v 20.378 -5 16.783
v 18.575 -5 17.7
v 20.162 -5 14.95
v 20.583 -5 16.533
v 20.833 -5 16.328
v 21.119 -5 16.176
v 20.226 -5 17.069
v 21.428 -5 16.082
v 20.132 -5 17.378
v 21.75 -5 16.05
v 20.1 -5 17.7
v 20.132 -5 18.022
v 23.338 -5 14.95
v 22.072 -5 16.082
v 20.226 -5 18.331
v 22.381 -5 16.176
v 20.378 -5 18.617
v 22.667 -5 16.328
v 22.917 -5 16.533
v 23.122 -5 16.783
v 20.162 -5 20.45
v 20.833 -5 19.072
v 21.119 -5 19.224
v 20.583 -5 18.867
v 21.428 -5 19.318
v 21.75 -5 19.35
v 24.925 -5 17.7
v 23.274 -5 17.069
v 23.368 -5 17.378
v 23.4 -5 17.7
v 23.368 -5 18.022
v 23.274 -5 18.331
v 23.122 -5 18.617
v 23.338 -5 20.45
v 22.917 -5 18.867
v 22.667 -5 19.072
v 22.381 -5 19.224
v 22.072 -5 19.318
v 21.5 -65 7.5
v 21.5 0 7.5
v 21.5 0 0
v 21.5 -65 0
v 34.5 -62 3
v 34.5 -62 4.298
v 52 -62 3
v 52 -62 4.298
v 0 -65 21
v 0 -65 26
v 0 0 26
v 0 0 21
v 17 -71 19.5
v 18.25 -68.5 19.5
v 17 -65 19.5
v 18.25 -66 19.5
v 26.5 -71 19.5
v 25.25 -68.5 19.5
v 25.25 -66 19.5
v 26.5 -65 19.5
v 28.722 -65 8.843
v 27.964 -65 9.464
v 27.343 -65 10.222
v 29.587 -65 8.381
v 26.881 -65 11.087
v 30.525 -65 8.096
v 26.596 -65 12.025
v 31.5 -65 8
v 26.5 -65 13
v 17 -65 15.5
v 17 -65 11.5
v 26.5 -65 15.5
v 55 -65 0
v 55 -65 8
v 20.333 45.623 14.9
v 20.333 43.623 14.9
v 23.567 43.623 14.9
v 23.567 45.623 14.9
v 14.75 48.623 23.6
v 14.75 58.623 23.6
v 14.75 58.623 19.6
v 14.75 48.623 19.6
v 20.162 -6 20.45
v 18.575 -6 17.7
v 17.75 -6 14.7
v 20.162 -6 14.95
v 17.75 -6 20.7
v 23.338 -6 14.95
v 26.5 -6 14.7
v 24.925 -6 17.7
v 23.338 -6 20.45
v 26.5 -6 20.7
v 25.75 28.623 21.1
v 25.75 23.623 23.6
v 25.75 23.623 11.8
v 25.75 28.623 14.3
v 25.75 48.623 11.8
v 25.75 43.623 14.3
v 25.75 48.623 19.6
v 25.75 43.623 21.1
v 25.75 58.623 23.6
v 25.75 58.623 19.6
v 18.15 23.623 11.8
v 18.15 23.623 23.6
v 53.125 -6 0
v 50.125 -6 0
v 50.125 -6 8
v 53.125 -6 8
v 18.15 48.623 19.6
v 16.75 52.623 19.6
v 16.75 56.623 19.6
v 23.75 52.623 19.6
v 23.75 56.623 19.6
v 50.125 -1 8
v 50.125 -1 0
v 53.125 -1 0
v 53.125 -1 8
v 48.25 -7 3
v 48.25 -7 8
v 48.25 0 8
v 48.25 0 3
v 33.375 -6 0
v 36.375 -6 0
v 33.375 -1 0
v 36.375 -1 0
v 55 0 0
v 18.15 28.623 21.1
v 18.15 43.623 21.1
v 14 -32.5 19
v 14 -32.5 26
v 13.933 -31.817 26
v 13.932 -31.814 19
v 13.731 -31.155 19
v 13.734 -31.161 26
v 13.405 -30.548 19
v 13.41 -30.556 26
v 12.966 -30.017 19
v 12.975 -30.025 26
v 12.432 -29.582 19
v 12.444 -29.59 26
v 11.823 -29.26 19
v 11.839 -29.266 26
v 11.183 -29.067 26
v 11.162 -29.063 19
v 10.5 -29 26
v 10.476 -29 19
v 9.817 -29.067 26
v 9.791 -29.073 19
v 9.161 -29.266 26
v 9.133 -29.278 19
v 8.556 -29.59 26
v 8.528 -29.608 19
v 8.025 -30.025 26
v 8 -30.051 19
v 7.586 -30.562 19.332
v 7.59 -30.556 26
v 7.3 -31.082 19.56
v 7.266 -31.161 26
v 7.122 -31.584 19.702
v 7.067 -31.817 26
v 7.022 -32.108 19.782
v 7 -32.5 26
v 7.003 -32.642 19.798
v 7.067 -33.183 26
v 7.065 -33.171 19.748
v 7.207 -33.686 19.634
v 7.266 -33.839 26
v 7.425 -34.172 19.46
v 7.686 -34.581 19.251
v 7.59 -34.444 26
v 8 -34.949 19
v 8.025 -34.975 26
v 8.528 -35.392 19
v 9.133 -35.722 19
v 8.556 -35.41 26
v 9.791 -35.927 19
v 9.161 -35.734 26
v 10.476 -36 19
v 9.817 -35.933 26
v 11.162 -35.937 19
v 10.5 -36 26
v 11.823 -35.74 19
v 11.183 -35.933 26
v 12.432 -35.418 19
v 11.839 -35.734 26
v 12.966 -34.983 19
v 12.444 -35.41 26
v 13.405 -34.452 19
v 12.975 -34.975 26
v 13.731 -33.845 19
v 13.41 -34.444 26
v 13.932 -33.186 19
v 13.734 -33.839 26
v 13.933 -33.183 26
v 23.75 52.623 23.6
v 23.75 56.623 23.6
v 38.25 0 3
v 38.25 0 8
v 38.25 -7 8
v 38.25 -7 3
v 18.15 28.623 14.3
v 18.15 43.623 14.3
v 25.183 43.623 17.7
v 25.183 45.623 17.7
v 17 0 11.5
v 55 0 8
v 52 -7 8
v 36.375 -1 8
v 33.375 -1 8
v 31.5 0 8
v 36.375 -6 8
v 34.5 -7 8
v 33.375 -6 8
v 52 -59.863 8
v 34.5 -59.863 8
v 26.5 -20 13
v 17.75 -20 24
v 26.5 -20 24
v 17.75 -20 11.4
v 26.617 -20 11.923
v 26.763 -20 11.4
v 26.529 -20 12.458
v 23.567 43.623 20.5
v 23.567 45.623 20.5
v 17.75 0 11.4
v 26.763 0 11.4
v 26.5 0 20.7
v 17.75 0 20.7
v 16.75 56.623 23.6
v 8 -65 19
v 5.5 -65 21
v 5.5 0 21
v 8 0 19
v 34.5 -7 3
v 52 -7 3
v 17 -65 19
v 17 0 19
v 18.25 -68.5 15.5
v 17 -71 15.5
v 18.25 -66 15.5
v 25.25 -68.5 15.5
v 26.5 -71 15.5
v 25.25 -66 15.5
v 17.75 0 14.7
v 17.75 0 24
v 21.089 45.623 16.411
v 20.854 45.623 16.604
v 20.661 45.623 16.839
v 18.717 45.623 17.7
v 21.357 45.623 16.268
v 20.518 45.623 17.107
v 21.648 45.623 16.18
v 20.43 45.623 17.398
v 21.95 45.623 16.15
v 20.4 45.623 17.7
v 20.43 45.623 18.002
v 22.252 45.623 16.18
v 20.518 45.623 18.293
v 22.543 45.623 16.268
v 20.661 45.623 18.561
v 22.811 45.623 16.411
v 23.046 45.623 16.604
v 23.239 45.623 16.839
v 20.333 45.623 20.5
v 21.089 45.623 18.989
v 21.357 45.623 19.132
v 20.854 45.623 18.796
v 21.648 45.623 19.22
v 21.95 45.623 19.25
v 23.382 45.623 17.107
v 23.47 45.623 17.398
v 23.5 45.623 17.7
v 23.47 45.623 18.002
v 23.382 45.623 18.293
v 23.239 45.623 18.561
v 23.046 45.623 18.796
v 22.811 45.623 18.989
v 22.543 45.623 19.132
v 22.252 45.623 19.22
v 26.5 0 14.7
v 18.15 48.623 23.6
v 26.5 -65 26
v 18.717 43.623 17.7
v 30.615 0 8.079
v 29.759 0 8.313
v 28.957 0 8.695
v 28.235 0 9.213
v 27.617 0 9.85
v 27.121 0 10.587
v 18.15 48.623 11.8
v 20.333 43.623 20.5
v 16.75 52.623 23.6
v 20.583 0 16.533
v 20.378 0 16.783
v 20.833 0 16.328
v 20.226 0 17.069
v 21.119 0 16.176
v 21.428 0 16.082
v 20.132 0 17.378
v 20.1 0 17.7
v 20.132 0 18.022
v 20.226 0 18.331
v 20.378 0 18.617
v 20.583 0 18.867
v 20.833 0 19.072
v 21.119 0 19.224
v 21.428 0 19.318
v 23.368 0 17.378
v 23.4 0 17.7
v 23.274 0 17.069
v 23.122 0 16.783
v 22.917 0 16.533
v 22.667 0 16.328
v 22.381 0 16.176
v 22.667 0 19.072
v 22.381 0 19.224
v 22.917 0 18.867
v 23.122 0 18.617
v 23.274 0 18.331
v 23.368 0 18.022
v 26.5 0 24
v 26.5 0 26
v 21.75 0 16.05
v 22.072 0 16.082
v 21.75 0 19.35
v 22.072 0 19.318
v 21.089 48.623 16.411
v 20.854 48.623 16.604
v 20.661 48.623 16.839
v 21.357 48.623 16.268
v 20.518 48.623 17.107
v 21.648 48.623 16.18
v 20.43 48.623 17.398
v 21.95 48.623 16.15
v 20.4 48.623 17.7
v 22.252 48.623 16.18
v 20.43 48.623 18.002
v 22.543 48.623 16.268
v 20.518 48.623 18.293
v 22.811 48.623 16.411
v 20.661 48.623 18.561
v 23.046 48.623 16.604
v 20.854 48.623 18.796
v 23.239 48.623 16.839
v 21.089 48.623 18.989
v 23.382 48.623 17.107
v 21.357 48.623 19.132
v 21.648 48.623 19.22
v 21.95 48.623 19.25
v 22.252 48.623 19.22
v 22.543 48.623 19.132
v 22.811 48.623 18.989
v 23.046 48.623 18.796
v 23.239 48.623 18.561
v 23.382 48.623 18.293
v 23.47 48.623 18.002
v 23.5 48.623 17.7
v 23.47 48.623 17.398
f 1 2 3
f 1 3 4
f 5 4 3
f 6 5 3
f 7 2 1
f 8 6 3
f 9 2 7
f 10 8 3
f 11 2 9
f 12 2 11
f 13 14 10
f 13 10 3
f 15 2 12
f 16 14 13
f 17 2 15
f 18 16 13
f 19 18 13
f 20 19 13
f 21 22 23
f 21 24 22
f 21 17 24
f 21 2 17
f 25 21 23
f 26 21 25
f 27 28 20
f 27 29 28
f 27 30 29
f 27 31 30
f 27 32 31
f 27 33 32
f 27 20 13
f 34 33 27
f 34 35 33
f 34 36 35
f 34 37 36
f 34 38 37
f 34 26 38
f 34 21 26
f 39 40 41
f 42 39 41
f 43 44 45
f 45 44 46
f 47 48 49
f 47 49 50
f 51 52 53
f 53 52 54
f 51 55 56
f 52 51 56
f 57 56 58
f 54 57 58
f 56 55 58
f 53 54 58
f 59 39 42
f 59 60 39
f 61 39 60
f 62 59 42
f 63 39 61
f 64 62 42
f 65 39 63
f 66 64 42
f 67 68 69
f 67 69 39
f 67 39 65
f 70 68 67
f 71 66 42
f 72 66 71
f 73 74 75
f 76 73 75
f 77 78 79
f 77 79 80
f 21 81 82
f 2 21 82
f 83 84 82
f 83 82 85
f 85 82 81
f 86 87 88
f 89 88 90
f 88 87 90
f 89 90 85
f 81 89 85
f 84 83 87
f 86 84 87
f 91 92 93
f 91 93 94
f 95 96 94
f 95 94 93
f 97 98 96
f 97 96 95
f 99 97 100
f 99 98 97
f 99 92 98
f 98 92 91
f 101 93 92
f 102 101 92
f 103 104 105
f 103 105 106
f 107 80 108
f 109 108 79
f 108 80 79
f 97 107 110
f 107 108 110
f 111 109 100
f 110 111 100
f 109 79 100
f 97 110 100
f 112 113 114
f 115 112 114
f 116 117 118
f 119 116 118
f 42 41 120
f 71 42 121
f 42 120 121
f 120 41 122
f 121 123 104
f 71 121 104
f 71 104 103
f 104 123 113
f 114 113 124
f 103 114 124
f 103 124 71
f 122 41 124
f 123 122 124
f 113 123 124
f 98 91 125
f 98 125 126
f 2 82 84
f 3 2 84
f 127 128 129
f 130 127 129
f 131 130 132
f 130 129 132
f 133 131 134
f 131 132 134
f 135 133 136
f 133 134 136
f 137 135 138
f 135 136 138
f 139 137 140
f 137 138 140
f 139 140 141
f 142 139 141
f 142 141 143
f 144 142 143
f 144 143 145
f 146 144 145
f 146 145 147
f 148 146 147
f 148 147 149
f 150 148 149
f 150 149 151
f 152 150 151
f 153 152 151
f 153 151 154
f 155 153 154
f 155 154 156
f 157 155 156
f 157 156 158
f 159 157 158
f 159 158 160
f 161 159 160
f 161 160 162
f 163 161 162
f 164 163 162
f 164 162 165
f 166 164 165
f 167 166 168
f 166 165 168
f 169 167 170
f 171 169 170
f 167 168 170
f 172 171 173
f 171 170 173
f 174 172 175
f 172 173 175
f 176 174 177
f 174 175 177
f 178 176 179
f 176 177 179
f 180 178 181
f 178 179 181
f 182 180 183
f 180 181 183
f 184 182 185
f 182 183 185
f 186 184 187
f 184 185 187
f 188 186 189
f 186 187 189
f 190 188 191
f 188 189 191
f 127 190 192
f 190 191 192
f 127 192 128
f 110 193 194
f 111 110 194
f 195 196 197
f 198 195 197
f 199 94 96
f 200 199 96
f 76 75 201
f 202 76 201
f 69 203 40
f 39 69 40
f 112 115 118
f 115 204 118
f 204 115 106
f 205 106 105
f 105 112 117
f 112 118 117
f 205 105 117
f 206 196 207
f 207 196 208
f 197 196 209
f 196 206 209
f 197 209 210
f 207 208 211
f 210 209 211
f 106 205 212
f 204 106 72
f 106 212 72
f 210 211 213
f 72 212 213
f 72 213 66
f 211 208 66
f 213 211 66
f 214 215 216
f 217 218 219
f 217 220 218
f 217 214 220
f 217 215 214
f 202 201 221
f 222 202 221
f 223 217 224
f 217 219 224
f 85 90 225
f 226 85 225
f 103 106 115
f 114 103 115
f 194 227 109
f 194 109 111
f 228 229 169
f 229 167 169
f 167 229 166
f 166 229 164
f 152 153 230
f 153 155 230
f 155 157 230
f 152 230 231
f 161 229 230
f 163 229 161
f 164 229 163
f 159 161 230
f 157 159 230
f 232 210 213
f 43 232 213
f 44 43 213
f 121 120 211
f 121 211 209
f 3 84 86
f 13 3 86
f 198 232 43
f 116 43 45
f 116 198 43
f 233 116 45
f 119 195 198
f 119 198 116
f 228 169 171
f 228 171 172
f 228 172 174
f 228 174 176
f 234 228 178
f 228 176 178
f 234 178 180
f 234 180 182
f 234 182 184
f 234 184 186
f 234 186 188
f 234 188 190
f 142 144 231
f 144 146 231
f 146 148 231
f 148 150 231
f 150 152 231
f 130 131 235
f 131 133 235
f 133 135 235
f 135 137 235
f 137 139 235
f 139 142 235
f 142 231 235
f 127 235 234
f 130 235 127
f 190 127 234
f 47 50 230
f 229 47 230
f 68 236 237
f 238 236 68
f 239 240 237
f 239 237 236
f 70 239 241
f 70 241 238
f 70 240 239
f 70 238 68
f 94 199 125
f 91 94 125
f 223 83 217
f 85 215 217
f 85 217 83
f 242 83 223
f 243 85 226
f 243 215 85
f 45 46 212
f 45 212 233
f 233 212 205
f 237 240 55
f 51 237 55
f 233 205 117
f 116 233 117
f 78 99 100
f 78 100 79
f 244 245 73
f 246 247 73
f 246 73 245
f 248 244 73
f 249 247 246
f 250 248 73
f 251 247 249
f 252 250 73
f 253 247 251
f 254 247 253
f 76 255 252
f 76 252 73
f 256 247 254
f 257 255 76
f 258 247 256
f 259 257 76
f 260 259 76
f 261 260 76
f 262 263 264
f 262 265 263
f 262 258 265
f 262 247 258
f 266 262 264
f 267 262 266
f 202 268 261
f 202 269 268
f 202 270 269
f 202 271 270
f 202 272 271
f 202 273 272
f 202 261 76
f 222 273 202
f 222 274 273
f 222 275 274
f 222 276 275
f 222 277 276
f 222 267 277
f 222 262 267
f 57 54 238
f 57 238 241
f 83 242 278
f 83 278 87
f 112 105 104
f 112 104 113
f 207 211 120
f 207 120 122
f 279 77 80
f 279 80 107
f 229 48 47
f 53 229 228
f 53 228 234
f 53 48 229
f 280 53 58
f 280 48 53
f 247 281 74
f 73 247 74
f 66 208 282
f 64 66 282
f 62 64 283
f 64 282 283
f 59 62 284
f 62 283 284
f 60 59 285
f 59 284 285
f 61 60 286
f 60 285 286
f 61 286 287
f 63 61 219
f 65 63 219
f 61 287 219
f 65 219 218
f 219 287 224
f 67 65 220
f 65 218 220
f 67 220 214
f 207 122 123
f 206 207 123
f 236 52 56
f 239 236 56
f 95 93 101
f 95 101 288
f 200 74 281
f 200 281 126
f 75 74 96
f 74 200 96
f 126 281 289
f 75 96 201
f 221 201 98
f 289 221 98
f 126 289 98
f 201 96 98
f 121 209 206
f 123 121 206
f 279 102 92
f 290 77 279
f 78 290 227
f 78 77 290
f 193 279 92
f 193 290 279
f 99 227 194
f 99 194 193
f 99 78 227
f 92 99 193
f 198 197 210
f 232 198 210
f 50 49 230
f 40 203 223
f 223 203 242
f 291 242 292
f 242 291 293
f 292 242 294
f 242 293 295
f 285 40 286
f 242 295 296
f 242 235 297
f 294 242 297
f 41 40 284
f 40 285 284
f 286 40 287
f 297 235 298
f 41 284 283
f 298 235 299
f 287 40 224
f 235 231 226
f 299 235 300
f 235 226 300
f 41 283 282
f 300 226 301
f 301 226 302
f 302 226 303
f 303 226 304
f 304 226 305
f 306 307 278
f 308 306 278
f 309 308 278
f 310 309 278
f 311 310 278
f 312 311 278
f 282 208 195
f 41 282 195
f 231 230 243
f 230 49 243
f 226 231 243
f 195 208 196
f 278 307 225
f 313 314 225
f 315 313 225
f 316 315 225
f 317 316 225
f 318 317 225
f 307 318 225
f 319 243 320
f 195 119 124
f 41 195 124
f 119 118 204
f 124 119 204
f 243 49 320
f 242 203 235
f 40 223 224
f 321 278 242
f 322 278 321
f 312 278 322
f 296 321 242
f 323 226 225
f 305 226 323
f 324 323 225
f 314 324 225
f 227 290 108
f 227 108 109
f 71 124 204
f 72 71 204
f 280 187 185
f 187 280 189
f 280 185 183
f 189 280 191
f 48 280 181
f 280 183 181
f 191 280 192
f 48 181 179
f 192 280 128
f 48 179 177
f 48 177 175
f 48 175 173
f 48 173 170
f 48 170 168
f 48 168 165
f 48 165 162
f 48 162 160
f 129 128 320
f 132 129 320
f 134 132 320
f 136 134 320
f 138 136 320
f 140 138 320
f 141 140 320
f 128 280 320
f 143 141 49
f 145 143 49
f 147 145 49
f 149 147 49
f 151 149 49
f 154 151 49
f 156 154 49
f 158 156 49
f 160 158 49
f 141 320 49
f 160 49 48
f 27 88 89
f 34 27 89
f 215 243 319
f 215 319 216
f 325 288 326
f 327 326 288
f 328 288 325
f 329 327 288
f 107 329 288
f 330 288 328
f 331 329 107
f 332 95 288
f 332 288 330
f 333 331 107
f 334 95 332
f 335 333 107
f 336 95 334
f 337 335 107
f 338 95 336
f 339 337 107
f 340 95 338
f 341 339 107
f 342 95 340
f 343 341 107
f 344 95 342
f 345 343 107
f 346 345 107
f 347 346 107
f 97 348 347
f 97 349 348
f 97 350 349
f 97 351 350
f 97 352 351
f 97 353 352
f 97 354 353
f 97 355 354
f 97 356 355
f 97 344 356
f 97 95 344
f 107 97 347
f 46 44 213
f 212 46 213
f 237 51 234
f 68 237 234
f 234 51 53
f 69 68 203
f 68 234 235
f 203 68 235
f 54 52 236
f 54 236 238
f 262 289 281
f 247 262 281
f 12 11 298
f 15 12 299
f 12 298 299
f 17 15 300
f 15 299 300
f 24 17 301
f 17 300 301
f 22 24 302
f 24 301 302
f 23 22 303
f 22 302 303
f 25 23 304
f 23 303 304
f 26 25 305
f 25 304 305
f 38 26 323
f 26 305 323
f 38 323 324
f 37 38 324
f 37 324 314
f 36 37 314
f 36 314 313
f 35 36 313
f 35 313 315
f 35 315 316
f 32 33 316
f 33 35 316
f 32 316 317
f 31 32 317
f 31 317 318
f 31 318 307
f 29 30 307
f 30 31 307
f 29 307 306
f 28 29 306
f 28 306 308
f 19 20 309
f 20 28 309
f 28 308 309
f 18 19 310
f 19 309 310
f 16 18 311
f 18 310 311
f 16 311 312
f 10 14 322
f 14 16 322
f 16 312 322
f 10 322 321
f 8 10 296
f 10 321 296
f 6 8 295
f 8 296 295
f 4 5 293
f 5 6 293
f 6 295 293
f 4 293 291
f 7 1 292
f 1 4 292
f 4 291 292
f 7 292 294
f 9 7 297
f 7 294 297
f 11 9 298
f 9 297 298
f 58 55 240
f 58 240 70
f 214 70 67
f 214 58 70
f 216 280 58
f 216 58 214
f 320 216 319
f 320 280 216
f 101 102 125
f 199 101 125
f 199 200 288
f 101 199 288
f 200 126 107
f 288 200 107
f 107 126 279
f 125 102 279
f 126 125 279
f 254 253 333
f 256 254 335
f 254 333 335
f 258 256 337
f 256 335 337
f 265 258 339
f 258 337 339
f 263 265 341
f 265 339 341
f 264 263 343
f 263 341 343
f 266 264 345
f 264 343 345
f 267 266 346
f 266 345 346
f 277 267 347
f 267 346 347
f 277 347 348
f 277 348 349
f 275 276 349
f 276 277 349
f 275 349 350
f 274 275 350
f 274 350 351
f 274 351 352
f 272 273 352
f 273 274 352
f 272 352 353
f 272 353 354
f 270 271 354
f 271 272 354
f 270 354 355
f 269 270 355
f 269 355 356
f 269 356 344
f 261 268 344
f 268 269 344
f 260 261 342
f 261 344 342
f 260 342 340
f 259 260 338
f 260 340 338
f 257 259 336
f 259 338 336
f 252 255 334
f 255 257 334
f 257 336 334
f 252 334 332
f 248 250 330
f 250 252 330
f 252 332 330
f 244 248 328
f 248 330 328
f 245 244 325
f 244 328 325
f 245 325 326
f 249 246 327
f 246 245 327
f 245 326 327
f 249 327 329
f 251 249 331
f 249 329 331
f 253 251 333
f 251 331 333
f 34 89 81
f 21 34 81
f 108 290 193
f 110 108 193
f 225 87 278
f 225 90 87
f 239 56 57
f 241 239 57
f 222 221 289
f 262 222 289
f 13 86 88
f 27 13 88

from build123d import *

# Parameters (mm, degrees)
F1_DEPTH  = 65
F2_R      = 3.5
F3_DEPTH  = 7
F5_DEPTH  = 5
F7_DEPTH  = 17.5
F9_W      = 6
F9_H      = 4
F10_DEPTH = 9.5
F11_W     = 7
F11_H     = 2.5
F12_DEPTH = 4
F15_DEPTH = 8
F16_R     = 1.65
F17_DEPTH = 6
F18_R     = 1.65
F19_DEPTH = 1
F20_DEPTH = 8
F21_DEPTH = 1.0139122871
F22_W     = 3
F22_H     = 5
F23_DEPTH = 8
F24_W     = 25
F24_H     = 11.8
F24_W_2   = 15
F24_H_2   = 6.8
F25_DEPTH = 7.6
F26_R     = 1.55
F27_DEPTH = 5
F28_R     = 1.55
F29_DEPTH = 2
F30_W     = 7
F30_H     = 4
F31_DEPTH = 4


# Not quite as in the source:
# - a feature names something its author has since deleted; it is built from what else it names


with BuildPart() as f1:
    # F0 (on Front) → F1 (new body)
    with BuildSketch(Plane.XZ):
        with BuildLine():
            Line((0, 26), (0, 21))
            Line((0, 21), (5.5, 21))
            Line((5.5, 21), (8, 19))
            Line((8, 19), (17, 19))
            Line((17, 19), (17, 11.5))
            Line((17, 11.5), (21.5, 7.5))
            Line((21.5, 7.5), (21.5, 0))
            Line((21.5, 0), (55, 0))
            Line((55, 0), (55, 8))
            Line((55, 8), (31.5, 8))
            ThreePointArc((31.5, 8), (27.9644660941, 9.4644660941), (26.5, 13))
            Line((26.5, 13), (26.5, 26))
            Line((26.5, 26), (0, 26))
        make_face()
    extrude(amount=F1_DEPTH)

    # F2 (on face) → F3 (cut, through all)
    with BuildSketch(Plane.XY.offset(26)):
        with Locations((10.5, -32.5)):
            Circle(F2_R)
    extrude(amount=-F3_DEPTH, mode=Mode.SUBTRACT)

    # F4 (on face) → F5 (cut)
    with BuildSketch(Plane.XY.offset(8)):
        Polygon((34.5, -62), (52, -62), (52, -7), (48.25, -7), (48.25, 0), (38.25, 0), (38.25, -7), (34.5, -7), align=None)
    extrude(amount=-F5_DEPTH, mode=Mode.SUBTRACT)

    # F6 (on face) → F7 (join, through all)
    with BuildSketch(Plane.YZ.offset(34.5)):
        Polygon((-62, 8), (-62, 4.2981612496), (-59.862742401, 8), align=None)
    extrude(amount=F7_DEPTH)

    # F9 (on offset) → F10 (join, through all)
    with BuildSketch(Plane.YZ.offset(26.5)):
        with Locations((-68, 17.5)):
            Rectangle(F9_W, F9_H)
    extrude(amount=-F10_DEPTH)

    # F11 (on face) → F12 (cut, through all)
    with BuildSketch(Plane.XY.offset(19.5)):
        with Locations((21.75, -67.25)):
            Rectangle(F11_W, F11_H)
    extrude(amount=-F12_DEPTH, mode=Mode.SUBTRACT)

    # F14 (on offset) → F15 (cut)
    with BuildSketch(Plane.YZ.offset(25.75)):
        Polygon((-20, 11.4), (0, 11.4), (0, 14.7), (-6, 14.7), (-6, 20.7), (0, 20.7), (0, 24), (-20, 24), align=None)
    extrude(amount=-F15_DEPTH, mode=Mode.SUBTRACT)

    # F16 (on face) → F17 (cut, through all)
    with BuildSketch(Plane(origin=(0, 0, 0), x_dir=(-1, 0, 0), z_dir=(0, 1, 0))):
        with Locations((-21.75, 17.7)):
            Circle(F16_R)
    extrude(amount=-F17_DEPTH, mode=Mode.SUBTRACT)

    # F18 (on face) → F19 (cut)
    with BuildSketch(Plane.XZ.offset(6)):
        Polygon((23.3377132403, 14.95), (24.9254264805, 17.7), (23.3377132403, 20.45), (20.1622867597, 20.45), (18.5745735195, 17.7), (20.1622867597, 14.95), align=None)
        with Locations((21.75, 17.7)):
            Circle(F18_R, mode=Mode.SUBTRACT)
    extrude(amount=-F19_DEPTH, mode=Mode.SUBTRACT)

    # F14 (on offset) → F20 (cut, through all)
    with BuildSketch(Plane.YZ.offset(25.75)):
        Polygon((-20, 11.4), (0, 11.4), (0, 14.7), (-6, 14.7), (-6, 20.7), (0, 20.7), (0, 24), (-20, 24), align=None)
    extrude(amount=-F20_DEPTH, mode=Mode.SUBTRACT)

    # F14 (on offset) → F21 (cut, through all)
    with BuildSketch(Plane.YZ.offset(25.75)):
        Polygon((-20, 11.4), (0, 11.4), (0, 14.7), (-6, 14.7), (-6, 20.7), (0, 20.7), (0, 24), (-20, 24), align=None)
    extrude(amount=F21_DEPTH, mode=Mode.SUBTRACT)

    # F22 (on face) → F23 (cut, through all)
    with BuildSketch(Plane.XY.offset(8)):
        with Locations((34.875, -3.5)):
            Rectangle(F22_W, F22_H)
        with Locations((51.625, -3.5)):
            Rectangle(F22_W, F22_H)
    extrude(amount=-F23_DEPTH, mode=Mode.SUBTRACT)


with BuildPart() as f25:
    # F24 (on offset) → F25 (new body)
    with BuildSketch(Plane.YZ.offset(25.75)):
        with Locations((36.1234692893, 17.7)):
            Rectangle(F24_W, F24_H)
        with Locations((36.1234692893, 17.7)):
            Rectangle(F24_W_2, F24_H_2, mode=Mode.SUBTRACT)
    extrude(amount=-F25_DEPTH)

    # F26 (on face) → F27 (cut, through all)
    with BuildSketch(Plane(origin=(0, 48.6234692893, 0), x_dir=(-1, 0, 0), z_dir=(0, 1, 0))):
        with Locations((-21.95, 17.7)):
            Circle(F26_R)
    extrude(amount=-F27_DEPTH, mode=Mode.SUBTRACT)

    # F28 (on face) → F29 (cut)
    with BuildSketch(Plane.XZ.offset(-43.6234692893)):
        Polygon((23.5665807537, 14.9), (25.1831615075, 17.7), (23.5665807537, 20.5), (20.3334192463, 20.5), (18.7168384925, 17.7), (20.3334192463, 14.9), align=None)
        with Locations((21.95, 17.7)):
            Circle(F28_R, mode=Mode.SUBTRACT)
    extrude(amount=-F29_DEPTH, mode=Mode.SUBTRACT)

    # F30 (on face) → F31 (join)
    with BuildSketch(Plane.XY.offset(23.6)):
        Polygon((14.75, 58.6234692893), (14.75, 48.6234692893), (18.15, 48.6234692893), (25.75, 48.6234692893), (25.75, 58.6234692893), align=None)
        with Locations((20.25, 54.6234692893)):
            Rectangle(F30_W, F30_H, mode=Mode.SUBTRACT)
    extrude(amount=-F31_DEPTH)


solid = Compound([f1.part, f25.part])
